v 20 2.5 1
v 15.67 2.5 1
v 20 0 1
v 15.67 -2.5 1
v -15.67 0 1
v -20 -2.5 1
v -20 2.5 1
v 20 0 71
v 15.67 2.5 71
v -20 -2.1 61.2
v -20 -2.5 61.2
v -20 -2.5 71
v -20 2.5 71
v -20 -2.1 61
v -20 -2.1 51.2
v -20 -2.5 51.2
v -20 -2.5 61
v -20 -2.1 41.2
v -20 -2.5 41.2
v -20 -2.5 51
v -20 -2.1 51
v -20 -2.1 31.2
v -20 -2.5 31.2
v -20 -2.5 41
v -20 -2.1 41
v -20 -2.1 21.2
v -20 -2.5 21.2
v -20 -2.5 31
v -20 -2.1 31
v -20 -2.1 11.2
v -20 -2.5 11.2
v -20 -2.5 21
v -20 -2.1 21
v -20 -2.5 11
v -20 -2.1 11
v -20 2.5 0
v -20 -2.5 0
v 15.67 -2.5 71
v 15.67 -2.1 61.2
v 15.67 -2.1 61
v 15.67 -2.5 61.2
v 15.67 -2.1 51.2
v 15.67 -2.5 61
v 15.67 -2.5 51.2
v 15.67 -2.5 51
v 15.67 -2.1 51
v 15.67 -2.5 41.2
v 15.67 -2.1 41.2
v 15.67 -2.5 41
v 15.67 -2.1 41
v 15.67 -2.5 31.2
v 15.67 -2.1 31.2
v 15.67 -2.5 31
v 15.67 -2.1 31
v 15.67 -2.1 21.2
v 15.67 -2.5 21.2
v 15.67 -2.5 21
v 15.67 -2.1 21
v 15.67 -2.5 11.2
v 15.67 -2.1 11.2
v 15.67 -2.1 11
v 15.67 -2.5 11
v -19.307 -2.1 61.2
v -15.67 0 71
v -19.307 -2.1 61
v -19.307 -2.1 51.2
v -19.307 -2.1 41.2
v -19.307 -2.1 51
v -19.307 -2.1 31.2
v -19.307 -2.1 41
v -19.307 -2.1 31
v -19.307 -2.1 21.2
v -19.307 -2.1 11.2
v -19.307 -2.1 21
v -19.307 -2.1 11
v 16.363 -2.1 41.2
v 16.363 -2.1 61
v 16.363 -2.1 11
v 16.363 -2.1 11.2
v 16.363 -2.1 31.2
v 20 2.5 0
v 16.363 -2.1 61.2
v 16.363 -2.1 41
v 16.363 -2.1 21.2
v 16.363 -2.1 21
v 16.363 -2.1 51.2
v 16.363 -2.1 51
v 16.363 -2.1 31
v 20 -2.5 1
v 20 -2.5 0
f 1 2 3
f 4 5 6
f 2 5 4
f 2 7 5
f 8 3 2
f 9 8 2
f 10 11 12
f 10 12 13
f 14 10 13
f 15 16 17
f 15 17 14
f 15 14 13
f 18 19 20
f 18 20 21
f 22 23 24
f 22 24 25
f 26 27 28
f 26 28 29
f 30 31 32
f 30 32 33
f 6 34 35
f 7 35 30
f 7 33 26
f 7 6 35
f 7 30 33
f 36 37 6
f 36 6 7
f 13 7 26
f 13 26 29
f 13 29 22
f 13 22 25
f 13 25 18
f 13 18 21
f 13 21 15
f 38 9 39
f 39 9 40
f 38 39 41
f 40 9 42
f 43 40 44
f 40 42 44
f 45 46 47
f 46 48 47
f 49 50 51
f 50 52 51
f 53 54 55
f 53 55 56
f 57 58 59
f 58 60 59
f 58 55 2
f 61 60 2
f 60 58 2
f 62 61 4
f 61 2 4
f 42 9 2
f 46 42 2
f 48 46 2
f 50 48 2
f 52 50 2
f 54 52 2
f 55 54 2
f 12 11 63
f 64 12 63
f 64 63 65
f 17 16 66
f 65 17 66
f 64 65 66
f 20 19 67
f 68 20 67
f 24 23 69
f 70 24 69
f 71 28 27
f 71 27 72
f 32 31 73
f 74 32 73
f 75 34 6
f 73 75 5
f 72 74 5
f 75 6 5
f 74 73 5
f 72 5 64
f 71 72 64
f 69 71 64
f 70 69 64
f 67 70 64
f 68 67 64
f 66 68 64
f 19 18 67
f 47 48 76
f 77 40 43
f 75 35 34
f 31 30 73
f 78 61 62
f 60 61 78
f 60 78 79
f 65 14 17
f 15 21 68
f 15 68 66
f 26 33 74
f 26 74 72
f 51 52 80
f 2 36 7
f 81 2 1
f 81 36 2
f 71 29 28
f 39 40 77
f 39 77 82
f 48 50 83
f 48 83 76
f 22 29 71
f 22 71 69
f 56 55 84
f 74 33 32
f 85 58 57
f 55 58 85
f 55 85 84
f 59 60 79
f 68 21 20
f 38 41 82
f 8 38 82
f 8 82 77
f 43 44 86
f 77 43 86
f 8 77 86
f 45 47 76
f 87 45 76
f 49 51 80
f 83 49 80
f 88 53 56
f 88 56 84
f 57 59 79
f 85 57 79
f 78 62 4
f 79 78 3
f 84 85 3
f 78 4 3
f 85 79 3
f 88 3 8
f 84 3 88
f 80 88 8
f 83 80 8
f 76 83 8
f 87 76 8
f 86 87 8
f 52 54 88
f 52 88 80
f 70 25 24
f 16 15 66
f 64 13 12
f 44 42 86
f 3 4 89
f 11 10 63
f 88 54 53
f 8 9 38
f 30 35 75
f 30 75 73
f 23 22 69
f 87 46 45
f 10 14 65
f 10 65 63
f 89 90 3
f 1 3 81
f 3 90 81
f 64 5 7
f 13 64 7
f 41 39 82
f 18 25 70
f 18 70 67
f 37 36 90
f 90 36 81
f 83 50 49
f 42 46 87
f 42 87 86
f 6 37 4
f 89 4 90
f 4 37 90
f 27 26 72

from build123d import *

# Parameters (mm, degrees)
F0_W     = 40
F0_H     = 5
F1_DEPTH = 1
F3_DEPTH = 71
F4_W     = 0.4
F4_H     = 0.2
F5_DEPTH = 40.001


with BuildPart() as f1:
    # F0 (on Top) → F1 (new body)
    with BuildSketch(Plane.XY):
        Rectangle(F0_W, F0_H)
    extrude(amount=F1_DEPTH)

    # F2 (on Top) → F3 (join)
    with BuildSketch(Plane.XY):
        Polygon((-15.669873, 0), (-20, 2.5), (-20, -2.5), align=None)
        Polygon((20, 0), (15.669873, 2.5), (15.669873, -2.5), align=None)
    extrude(amount=F3_DEPTH)

    # F4 (on face) → F5 (cut, through all)
    with BuildSketch(Plane(origin=(-20, 0, 0), x_dir=(0, -1, 0), z_dir=(-1, 0, 0))):
        with Locations((2.3, 11.1)):
            Rectangle(F4_W, F4_H)
        with Locations((2.3, 21.1)):
            Rectangle(F4_W, F4_H)
        with Locations((2.3, 31.1)):
            Rectangle(F4_W, F4_H)
        with Locations((2.3, 41.1)):
            Rectangle(F4_W, F4_H)
        with Locations((2.3, 51.1)):
            Rectangle(F4_W, F4_H)
        with Locations((2.3, 61.1)):
            Rectangle(F4_W, F4_H)
        with Locations((2.3, 71.1)):
            Rectangle(F4_W, F4_H)
    extrude(amount=-F5_DEPTH, mode=Mode.SUBTRACT)


solid = f1.part
